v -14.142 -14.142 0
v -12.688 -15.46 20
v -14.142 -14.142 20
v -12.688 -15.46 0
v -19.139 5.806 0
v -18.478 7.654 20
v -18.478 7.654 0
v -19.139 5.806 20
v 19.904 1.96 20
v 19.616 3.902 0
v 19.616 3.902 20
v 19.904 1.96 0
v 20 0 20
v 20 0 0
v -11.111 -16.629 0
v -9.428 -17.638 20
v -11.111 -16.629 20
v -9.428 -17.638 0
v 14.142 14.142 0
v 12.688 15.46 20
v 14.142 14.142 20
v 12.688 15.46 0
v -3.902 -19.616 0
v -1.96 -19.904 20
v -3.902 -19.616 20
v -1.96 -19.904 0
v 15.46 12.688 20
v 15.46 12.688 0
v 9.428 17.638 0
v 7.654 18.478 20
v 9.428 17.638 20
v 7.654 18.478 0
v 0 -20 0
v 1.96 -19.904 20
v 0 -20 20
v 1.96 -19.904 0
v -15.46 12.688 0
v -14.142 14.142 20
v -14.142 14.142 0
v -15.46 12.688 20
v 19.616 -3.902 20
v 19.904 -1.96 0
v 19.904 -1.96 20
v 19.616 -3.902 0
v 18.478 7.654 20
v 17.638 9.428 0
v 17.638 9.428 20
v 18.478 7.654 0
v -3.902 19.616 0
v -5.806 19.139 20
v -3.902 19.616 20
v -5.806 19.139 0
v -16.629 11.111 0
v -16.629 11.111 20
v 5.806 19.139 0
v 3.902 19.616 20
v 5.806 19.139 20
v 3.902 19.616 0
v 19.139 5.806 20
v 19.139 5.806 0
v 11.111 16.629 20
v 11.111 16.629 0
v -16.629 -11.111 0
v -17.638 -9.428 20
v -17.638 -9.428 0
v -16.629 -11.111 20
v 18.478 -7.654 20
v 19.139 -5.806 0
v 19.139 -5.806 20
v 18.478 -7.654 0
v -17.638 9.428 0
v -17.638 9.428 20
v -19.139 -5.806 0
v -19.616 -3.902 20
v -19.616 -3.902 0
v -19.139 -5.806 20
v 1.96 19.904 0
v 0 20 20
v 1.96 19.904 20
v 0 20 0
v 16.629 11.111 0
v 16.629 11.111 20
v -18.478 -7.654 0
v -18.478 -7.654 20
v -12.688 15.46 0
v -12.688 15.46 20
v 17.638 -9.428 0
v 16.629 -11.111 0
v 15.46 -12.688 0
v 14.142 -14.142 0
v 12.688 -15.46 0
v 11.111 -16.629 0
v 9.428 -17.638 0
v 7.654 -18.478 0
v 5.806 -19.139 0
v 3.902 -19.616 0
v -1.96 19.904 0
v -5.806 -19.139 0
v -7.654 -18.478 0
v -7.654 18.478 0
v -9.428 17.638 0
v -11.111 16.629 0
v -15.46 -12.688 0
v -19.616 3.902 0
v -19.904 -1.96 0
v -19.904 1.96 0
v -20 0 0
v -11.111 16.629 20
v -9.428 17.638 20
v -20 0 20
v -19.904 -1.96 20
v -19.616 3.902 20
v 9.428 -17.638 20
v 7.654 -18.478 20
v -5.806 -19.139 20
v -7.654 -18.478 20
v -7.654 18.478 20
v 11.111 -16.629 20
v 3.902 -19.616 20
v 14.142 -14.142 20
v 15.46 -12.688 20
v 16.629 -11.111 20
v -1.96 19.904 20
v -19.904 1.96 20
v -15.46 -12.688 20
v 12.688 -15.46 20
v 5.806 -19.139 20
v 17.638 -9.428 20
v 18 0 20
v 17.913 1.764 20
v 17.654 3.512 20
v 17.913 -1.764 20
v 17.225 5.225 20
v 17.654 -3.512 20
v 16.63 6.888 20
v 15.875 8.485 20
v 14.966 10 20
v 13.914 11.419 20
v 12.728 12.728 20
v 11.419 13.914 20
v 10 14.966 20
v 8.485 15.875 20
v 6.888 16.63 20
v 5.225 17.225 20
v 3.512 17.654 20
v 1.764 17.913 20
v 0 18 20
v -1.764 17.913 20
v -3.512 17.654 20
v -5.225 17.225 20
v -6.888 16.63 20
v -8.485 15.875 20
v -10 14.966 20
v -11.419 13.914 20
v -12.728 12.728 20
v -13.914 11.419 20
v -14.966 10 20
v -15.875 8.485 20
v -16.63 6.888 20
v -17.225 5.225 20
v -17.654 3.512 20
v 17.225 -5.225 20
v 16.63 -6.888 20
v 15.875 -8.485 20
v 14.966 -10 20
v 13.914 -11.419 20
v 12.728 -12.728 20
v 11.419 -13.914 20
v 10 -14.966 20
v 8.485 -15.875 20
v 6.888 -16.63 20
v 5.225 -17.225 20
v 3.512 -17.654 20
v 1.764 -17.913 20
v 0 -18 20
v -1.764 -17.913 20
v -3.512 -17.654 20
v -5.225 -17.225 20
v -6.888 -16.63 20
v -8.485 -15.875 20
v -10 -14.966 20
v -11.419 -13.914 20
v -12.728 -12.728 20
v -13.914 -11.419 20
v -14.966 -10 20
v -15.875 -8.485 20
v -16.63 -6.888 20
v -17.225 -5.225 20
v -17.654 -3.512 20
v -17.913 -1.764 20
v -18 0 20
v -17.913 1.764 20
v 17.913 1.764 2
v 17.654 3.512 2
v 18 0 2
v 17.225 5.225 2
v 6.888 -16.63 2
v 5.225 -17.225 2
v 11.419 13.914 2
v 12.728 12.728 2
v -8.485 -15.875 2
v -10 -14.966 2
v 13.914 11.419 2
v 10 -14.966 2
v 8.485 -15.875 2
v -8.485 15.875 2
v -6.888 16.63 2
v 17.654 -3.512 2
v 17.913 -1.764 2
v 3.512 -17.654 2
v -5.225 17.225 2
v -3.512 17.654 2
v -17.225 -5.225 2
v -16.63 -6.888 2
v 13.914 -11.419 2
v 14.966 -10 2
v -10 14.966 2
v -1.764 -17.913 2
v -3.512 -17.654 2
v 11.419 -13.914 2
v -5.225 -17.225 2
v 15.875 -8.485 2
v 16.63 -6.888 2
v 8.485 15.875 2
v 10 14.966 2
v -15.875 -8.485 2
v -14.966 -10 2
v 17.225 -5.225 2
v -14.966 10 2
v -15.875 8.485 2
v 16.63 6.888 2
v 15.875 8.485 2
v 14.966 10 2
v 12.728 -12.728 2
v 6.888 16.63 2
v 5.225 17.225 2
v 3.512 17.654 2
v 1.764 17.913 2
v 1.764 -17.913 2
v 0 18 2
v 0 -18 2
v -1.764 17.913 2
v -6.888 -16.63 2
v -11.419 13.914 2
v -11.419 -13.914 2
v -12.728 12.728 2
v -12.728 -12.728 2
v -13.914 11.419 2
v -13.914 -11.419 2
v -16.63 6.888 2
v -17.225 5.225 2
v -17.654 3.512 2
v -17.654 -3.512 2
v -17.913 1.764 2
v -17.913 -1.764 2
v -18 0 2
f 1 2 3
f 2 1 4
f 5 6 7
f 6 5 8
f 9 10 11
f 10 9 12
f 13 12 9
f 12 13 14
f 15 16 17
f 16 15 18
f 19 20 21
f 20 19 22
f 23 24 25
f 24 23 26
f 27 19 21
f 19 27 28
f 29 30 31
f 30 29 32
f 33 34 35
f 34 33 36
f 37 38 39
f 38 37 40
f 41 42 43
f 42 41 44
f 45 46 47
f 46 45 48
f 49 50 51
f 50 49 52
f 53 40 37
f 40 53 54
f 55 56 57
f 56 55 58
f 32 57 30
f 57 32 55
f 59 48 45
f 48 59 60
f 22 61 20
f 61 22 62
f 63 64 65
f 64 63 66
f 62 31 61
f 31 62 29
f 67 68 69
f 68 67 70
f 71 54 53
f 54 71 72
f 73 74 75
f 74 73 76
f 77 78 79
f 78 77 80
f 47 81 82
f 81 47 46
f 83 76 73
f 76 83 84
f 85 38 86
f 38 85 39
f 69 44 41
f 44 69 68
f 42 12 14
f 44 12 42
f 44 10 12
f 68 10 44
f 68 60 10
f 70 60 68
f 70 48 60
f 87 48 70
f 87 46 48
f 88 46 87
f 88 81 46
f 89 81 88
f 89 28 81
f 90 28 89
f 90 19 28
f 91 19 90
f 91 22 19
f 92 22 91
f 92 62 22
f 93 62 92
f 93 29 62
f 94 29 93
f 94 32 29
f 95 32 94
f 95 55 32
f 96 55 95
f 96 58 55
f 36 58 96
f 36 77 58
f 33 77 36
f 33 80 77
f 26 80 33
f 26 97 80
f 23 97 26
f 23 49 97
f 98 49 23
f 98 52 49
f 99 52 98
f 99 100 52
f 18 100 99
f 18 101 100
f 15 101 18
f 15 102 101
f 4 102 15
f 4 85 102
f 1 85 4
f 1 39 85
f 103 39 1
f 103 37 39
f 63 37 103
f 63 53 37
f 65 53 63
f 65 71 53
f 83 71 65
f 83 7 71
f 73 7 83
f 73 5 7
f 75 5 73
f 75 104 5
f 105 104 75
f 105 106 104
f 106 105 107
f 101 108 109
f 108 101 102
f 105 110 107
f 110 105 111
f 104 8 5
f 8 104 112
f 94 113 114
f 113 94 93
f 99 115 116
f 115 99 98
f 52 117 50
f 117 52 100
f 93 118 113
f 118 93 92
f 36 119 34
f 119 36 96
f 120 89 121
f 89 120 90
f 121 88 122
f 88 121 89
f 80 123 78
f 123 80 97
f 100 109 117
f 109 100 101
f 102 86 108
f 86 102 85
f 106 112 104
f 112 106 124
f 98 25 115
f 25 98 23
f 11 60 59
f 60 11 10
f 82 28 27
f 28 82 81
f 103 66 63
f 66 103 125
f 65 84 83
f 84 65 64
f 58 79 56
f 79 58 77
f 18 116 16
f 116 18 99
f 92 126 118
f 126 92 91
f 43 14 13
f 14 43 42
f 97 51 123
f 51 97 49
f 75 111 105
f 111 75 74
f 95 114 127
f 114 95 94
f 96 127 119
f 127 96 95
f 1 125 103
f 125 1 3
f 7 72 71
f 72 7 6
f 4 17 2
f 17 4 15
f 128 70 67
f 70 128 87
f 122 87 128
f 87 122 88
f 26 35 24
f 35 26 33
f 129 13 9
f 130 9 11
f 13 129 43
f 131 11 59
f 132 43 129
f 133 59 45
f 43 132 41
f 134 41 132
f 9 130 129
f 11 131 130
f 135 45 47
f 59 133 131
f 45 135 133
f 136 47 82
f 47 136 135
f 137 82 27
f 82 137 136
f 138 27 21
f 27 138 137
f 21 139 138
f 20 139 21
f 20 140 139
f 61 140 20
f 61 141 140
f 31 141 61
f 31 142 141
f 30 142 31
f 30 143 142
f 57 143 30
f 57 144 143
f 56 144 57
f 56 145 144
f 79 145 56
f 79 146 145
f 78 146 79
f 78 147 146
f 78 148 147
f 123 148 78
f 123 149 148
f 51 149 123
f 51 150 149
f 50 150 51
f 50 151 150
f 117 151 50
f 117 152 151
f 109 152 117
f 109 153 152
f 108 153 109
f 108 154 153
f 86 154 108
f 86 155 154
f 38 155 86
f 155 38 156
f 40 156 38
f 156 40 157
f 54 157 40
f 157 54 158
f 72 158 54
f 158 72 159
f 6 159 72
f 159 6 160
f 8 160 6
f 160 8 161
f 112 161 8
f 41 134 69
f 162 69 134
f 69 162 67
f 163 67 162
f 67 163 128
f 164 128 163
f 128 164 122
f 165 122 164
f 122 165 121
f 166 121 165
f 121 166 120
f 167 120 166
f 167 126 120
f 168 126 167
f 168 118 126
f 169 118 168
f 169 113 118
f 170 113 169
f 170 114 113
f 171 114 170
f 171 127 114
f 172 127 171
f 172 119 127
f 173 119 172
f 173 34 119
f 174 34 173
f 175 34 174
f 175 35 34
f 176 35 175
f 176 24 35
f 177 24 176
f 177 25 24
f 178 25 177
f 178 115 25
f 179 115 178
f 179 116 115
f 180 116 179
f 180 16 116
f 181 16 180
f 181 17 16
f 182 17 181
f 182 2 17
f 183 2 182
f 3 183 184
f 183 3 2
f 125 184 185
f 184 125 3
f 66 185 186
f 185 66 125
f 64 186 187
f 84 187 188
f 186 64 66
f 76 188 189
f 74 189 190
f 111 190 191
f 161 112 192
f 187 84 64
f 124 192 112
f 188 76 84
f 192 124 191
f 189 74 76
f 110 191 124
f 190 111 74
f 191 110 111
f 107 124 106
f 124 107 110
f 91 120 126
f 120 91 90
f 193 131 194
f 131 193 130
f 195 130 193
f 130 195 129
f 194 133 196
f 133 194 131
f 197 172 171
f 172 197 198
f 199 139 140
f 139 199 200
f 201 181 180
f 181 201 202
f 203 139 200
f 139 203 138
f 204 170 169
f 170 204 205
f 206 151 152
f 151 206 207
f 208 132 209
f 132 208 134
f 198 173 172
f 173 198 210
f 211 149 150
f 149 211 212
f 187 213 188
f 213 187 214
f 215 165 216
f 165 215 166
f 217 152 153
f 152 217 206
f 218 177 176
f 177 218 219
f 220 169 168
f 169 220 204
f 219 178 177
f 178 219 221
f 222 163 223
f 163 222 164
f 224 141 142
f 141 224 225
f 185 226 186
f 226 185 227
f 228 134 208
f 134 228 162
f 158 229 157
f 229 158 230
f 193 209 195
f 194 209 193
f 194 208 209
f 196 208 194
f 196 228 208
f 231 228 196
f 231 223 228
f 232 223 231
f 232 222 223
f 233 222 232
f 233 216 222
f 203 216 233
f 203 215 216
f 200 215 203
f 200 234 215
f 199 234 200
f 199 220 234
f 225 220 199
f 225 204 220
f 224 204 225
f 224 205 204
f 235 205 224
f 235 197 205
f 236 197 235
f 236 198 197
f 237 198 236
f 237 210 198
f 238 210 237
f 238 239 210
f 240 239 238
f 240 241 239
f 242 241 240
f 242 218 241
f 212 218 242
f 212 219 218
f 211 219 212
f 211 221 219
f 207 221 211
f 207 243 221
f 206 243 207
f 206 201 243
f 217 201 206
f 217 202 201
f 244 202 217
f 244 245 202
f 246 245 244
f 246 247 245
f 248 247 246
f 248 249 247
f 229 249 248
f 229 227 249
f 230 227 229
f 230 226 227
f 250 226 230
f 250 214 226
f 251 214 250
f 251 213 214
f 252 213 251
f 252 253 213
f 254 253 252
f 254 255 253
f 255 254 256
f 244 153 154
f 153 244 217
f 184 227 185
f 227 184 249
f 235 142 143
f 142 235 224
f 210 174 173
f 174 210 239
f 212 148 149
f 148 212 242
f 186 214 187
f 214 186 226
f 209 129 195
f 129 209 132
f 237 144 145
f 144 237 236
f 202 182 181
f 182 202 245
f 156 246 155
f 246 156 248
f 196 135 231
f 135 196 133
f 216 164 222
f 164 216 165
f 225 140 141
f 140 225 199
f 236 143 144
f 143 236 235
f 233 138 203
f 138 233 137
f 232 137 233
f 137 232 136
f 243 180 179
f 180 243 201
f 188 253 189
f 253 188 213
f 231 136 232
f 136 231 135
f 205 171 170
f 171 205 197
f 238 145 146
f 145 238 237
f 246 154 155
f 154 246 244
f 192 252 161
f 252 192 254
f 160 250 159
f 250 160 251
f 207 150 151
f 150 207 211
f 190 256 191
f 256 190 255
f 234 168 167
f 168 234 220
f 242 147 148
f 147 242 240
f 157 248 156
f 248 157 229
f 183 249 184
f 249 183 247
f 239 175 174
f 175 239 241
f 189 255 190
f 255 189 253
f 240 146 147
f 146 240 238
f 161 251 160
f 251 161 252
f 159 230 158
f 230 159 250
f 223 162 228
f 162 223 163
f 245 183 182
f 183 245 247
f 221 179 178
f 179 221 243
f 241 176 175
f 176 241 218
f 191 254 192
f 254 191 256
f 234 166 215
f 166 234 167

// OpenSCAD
module ht_40_cap() {
    difference() {
        // Outer cylinder
        cylinder(h=20, d=40, $fn=64);
        // Inner cylinder (hollow part)
        translate([0, 0, 2])
            cylinder(h=18, d=36, $fn=64);
    }
}

ht_40_cap();
